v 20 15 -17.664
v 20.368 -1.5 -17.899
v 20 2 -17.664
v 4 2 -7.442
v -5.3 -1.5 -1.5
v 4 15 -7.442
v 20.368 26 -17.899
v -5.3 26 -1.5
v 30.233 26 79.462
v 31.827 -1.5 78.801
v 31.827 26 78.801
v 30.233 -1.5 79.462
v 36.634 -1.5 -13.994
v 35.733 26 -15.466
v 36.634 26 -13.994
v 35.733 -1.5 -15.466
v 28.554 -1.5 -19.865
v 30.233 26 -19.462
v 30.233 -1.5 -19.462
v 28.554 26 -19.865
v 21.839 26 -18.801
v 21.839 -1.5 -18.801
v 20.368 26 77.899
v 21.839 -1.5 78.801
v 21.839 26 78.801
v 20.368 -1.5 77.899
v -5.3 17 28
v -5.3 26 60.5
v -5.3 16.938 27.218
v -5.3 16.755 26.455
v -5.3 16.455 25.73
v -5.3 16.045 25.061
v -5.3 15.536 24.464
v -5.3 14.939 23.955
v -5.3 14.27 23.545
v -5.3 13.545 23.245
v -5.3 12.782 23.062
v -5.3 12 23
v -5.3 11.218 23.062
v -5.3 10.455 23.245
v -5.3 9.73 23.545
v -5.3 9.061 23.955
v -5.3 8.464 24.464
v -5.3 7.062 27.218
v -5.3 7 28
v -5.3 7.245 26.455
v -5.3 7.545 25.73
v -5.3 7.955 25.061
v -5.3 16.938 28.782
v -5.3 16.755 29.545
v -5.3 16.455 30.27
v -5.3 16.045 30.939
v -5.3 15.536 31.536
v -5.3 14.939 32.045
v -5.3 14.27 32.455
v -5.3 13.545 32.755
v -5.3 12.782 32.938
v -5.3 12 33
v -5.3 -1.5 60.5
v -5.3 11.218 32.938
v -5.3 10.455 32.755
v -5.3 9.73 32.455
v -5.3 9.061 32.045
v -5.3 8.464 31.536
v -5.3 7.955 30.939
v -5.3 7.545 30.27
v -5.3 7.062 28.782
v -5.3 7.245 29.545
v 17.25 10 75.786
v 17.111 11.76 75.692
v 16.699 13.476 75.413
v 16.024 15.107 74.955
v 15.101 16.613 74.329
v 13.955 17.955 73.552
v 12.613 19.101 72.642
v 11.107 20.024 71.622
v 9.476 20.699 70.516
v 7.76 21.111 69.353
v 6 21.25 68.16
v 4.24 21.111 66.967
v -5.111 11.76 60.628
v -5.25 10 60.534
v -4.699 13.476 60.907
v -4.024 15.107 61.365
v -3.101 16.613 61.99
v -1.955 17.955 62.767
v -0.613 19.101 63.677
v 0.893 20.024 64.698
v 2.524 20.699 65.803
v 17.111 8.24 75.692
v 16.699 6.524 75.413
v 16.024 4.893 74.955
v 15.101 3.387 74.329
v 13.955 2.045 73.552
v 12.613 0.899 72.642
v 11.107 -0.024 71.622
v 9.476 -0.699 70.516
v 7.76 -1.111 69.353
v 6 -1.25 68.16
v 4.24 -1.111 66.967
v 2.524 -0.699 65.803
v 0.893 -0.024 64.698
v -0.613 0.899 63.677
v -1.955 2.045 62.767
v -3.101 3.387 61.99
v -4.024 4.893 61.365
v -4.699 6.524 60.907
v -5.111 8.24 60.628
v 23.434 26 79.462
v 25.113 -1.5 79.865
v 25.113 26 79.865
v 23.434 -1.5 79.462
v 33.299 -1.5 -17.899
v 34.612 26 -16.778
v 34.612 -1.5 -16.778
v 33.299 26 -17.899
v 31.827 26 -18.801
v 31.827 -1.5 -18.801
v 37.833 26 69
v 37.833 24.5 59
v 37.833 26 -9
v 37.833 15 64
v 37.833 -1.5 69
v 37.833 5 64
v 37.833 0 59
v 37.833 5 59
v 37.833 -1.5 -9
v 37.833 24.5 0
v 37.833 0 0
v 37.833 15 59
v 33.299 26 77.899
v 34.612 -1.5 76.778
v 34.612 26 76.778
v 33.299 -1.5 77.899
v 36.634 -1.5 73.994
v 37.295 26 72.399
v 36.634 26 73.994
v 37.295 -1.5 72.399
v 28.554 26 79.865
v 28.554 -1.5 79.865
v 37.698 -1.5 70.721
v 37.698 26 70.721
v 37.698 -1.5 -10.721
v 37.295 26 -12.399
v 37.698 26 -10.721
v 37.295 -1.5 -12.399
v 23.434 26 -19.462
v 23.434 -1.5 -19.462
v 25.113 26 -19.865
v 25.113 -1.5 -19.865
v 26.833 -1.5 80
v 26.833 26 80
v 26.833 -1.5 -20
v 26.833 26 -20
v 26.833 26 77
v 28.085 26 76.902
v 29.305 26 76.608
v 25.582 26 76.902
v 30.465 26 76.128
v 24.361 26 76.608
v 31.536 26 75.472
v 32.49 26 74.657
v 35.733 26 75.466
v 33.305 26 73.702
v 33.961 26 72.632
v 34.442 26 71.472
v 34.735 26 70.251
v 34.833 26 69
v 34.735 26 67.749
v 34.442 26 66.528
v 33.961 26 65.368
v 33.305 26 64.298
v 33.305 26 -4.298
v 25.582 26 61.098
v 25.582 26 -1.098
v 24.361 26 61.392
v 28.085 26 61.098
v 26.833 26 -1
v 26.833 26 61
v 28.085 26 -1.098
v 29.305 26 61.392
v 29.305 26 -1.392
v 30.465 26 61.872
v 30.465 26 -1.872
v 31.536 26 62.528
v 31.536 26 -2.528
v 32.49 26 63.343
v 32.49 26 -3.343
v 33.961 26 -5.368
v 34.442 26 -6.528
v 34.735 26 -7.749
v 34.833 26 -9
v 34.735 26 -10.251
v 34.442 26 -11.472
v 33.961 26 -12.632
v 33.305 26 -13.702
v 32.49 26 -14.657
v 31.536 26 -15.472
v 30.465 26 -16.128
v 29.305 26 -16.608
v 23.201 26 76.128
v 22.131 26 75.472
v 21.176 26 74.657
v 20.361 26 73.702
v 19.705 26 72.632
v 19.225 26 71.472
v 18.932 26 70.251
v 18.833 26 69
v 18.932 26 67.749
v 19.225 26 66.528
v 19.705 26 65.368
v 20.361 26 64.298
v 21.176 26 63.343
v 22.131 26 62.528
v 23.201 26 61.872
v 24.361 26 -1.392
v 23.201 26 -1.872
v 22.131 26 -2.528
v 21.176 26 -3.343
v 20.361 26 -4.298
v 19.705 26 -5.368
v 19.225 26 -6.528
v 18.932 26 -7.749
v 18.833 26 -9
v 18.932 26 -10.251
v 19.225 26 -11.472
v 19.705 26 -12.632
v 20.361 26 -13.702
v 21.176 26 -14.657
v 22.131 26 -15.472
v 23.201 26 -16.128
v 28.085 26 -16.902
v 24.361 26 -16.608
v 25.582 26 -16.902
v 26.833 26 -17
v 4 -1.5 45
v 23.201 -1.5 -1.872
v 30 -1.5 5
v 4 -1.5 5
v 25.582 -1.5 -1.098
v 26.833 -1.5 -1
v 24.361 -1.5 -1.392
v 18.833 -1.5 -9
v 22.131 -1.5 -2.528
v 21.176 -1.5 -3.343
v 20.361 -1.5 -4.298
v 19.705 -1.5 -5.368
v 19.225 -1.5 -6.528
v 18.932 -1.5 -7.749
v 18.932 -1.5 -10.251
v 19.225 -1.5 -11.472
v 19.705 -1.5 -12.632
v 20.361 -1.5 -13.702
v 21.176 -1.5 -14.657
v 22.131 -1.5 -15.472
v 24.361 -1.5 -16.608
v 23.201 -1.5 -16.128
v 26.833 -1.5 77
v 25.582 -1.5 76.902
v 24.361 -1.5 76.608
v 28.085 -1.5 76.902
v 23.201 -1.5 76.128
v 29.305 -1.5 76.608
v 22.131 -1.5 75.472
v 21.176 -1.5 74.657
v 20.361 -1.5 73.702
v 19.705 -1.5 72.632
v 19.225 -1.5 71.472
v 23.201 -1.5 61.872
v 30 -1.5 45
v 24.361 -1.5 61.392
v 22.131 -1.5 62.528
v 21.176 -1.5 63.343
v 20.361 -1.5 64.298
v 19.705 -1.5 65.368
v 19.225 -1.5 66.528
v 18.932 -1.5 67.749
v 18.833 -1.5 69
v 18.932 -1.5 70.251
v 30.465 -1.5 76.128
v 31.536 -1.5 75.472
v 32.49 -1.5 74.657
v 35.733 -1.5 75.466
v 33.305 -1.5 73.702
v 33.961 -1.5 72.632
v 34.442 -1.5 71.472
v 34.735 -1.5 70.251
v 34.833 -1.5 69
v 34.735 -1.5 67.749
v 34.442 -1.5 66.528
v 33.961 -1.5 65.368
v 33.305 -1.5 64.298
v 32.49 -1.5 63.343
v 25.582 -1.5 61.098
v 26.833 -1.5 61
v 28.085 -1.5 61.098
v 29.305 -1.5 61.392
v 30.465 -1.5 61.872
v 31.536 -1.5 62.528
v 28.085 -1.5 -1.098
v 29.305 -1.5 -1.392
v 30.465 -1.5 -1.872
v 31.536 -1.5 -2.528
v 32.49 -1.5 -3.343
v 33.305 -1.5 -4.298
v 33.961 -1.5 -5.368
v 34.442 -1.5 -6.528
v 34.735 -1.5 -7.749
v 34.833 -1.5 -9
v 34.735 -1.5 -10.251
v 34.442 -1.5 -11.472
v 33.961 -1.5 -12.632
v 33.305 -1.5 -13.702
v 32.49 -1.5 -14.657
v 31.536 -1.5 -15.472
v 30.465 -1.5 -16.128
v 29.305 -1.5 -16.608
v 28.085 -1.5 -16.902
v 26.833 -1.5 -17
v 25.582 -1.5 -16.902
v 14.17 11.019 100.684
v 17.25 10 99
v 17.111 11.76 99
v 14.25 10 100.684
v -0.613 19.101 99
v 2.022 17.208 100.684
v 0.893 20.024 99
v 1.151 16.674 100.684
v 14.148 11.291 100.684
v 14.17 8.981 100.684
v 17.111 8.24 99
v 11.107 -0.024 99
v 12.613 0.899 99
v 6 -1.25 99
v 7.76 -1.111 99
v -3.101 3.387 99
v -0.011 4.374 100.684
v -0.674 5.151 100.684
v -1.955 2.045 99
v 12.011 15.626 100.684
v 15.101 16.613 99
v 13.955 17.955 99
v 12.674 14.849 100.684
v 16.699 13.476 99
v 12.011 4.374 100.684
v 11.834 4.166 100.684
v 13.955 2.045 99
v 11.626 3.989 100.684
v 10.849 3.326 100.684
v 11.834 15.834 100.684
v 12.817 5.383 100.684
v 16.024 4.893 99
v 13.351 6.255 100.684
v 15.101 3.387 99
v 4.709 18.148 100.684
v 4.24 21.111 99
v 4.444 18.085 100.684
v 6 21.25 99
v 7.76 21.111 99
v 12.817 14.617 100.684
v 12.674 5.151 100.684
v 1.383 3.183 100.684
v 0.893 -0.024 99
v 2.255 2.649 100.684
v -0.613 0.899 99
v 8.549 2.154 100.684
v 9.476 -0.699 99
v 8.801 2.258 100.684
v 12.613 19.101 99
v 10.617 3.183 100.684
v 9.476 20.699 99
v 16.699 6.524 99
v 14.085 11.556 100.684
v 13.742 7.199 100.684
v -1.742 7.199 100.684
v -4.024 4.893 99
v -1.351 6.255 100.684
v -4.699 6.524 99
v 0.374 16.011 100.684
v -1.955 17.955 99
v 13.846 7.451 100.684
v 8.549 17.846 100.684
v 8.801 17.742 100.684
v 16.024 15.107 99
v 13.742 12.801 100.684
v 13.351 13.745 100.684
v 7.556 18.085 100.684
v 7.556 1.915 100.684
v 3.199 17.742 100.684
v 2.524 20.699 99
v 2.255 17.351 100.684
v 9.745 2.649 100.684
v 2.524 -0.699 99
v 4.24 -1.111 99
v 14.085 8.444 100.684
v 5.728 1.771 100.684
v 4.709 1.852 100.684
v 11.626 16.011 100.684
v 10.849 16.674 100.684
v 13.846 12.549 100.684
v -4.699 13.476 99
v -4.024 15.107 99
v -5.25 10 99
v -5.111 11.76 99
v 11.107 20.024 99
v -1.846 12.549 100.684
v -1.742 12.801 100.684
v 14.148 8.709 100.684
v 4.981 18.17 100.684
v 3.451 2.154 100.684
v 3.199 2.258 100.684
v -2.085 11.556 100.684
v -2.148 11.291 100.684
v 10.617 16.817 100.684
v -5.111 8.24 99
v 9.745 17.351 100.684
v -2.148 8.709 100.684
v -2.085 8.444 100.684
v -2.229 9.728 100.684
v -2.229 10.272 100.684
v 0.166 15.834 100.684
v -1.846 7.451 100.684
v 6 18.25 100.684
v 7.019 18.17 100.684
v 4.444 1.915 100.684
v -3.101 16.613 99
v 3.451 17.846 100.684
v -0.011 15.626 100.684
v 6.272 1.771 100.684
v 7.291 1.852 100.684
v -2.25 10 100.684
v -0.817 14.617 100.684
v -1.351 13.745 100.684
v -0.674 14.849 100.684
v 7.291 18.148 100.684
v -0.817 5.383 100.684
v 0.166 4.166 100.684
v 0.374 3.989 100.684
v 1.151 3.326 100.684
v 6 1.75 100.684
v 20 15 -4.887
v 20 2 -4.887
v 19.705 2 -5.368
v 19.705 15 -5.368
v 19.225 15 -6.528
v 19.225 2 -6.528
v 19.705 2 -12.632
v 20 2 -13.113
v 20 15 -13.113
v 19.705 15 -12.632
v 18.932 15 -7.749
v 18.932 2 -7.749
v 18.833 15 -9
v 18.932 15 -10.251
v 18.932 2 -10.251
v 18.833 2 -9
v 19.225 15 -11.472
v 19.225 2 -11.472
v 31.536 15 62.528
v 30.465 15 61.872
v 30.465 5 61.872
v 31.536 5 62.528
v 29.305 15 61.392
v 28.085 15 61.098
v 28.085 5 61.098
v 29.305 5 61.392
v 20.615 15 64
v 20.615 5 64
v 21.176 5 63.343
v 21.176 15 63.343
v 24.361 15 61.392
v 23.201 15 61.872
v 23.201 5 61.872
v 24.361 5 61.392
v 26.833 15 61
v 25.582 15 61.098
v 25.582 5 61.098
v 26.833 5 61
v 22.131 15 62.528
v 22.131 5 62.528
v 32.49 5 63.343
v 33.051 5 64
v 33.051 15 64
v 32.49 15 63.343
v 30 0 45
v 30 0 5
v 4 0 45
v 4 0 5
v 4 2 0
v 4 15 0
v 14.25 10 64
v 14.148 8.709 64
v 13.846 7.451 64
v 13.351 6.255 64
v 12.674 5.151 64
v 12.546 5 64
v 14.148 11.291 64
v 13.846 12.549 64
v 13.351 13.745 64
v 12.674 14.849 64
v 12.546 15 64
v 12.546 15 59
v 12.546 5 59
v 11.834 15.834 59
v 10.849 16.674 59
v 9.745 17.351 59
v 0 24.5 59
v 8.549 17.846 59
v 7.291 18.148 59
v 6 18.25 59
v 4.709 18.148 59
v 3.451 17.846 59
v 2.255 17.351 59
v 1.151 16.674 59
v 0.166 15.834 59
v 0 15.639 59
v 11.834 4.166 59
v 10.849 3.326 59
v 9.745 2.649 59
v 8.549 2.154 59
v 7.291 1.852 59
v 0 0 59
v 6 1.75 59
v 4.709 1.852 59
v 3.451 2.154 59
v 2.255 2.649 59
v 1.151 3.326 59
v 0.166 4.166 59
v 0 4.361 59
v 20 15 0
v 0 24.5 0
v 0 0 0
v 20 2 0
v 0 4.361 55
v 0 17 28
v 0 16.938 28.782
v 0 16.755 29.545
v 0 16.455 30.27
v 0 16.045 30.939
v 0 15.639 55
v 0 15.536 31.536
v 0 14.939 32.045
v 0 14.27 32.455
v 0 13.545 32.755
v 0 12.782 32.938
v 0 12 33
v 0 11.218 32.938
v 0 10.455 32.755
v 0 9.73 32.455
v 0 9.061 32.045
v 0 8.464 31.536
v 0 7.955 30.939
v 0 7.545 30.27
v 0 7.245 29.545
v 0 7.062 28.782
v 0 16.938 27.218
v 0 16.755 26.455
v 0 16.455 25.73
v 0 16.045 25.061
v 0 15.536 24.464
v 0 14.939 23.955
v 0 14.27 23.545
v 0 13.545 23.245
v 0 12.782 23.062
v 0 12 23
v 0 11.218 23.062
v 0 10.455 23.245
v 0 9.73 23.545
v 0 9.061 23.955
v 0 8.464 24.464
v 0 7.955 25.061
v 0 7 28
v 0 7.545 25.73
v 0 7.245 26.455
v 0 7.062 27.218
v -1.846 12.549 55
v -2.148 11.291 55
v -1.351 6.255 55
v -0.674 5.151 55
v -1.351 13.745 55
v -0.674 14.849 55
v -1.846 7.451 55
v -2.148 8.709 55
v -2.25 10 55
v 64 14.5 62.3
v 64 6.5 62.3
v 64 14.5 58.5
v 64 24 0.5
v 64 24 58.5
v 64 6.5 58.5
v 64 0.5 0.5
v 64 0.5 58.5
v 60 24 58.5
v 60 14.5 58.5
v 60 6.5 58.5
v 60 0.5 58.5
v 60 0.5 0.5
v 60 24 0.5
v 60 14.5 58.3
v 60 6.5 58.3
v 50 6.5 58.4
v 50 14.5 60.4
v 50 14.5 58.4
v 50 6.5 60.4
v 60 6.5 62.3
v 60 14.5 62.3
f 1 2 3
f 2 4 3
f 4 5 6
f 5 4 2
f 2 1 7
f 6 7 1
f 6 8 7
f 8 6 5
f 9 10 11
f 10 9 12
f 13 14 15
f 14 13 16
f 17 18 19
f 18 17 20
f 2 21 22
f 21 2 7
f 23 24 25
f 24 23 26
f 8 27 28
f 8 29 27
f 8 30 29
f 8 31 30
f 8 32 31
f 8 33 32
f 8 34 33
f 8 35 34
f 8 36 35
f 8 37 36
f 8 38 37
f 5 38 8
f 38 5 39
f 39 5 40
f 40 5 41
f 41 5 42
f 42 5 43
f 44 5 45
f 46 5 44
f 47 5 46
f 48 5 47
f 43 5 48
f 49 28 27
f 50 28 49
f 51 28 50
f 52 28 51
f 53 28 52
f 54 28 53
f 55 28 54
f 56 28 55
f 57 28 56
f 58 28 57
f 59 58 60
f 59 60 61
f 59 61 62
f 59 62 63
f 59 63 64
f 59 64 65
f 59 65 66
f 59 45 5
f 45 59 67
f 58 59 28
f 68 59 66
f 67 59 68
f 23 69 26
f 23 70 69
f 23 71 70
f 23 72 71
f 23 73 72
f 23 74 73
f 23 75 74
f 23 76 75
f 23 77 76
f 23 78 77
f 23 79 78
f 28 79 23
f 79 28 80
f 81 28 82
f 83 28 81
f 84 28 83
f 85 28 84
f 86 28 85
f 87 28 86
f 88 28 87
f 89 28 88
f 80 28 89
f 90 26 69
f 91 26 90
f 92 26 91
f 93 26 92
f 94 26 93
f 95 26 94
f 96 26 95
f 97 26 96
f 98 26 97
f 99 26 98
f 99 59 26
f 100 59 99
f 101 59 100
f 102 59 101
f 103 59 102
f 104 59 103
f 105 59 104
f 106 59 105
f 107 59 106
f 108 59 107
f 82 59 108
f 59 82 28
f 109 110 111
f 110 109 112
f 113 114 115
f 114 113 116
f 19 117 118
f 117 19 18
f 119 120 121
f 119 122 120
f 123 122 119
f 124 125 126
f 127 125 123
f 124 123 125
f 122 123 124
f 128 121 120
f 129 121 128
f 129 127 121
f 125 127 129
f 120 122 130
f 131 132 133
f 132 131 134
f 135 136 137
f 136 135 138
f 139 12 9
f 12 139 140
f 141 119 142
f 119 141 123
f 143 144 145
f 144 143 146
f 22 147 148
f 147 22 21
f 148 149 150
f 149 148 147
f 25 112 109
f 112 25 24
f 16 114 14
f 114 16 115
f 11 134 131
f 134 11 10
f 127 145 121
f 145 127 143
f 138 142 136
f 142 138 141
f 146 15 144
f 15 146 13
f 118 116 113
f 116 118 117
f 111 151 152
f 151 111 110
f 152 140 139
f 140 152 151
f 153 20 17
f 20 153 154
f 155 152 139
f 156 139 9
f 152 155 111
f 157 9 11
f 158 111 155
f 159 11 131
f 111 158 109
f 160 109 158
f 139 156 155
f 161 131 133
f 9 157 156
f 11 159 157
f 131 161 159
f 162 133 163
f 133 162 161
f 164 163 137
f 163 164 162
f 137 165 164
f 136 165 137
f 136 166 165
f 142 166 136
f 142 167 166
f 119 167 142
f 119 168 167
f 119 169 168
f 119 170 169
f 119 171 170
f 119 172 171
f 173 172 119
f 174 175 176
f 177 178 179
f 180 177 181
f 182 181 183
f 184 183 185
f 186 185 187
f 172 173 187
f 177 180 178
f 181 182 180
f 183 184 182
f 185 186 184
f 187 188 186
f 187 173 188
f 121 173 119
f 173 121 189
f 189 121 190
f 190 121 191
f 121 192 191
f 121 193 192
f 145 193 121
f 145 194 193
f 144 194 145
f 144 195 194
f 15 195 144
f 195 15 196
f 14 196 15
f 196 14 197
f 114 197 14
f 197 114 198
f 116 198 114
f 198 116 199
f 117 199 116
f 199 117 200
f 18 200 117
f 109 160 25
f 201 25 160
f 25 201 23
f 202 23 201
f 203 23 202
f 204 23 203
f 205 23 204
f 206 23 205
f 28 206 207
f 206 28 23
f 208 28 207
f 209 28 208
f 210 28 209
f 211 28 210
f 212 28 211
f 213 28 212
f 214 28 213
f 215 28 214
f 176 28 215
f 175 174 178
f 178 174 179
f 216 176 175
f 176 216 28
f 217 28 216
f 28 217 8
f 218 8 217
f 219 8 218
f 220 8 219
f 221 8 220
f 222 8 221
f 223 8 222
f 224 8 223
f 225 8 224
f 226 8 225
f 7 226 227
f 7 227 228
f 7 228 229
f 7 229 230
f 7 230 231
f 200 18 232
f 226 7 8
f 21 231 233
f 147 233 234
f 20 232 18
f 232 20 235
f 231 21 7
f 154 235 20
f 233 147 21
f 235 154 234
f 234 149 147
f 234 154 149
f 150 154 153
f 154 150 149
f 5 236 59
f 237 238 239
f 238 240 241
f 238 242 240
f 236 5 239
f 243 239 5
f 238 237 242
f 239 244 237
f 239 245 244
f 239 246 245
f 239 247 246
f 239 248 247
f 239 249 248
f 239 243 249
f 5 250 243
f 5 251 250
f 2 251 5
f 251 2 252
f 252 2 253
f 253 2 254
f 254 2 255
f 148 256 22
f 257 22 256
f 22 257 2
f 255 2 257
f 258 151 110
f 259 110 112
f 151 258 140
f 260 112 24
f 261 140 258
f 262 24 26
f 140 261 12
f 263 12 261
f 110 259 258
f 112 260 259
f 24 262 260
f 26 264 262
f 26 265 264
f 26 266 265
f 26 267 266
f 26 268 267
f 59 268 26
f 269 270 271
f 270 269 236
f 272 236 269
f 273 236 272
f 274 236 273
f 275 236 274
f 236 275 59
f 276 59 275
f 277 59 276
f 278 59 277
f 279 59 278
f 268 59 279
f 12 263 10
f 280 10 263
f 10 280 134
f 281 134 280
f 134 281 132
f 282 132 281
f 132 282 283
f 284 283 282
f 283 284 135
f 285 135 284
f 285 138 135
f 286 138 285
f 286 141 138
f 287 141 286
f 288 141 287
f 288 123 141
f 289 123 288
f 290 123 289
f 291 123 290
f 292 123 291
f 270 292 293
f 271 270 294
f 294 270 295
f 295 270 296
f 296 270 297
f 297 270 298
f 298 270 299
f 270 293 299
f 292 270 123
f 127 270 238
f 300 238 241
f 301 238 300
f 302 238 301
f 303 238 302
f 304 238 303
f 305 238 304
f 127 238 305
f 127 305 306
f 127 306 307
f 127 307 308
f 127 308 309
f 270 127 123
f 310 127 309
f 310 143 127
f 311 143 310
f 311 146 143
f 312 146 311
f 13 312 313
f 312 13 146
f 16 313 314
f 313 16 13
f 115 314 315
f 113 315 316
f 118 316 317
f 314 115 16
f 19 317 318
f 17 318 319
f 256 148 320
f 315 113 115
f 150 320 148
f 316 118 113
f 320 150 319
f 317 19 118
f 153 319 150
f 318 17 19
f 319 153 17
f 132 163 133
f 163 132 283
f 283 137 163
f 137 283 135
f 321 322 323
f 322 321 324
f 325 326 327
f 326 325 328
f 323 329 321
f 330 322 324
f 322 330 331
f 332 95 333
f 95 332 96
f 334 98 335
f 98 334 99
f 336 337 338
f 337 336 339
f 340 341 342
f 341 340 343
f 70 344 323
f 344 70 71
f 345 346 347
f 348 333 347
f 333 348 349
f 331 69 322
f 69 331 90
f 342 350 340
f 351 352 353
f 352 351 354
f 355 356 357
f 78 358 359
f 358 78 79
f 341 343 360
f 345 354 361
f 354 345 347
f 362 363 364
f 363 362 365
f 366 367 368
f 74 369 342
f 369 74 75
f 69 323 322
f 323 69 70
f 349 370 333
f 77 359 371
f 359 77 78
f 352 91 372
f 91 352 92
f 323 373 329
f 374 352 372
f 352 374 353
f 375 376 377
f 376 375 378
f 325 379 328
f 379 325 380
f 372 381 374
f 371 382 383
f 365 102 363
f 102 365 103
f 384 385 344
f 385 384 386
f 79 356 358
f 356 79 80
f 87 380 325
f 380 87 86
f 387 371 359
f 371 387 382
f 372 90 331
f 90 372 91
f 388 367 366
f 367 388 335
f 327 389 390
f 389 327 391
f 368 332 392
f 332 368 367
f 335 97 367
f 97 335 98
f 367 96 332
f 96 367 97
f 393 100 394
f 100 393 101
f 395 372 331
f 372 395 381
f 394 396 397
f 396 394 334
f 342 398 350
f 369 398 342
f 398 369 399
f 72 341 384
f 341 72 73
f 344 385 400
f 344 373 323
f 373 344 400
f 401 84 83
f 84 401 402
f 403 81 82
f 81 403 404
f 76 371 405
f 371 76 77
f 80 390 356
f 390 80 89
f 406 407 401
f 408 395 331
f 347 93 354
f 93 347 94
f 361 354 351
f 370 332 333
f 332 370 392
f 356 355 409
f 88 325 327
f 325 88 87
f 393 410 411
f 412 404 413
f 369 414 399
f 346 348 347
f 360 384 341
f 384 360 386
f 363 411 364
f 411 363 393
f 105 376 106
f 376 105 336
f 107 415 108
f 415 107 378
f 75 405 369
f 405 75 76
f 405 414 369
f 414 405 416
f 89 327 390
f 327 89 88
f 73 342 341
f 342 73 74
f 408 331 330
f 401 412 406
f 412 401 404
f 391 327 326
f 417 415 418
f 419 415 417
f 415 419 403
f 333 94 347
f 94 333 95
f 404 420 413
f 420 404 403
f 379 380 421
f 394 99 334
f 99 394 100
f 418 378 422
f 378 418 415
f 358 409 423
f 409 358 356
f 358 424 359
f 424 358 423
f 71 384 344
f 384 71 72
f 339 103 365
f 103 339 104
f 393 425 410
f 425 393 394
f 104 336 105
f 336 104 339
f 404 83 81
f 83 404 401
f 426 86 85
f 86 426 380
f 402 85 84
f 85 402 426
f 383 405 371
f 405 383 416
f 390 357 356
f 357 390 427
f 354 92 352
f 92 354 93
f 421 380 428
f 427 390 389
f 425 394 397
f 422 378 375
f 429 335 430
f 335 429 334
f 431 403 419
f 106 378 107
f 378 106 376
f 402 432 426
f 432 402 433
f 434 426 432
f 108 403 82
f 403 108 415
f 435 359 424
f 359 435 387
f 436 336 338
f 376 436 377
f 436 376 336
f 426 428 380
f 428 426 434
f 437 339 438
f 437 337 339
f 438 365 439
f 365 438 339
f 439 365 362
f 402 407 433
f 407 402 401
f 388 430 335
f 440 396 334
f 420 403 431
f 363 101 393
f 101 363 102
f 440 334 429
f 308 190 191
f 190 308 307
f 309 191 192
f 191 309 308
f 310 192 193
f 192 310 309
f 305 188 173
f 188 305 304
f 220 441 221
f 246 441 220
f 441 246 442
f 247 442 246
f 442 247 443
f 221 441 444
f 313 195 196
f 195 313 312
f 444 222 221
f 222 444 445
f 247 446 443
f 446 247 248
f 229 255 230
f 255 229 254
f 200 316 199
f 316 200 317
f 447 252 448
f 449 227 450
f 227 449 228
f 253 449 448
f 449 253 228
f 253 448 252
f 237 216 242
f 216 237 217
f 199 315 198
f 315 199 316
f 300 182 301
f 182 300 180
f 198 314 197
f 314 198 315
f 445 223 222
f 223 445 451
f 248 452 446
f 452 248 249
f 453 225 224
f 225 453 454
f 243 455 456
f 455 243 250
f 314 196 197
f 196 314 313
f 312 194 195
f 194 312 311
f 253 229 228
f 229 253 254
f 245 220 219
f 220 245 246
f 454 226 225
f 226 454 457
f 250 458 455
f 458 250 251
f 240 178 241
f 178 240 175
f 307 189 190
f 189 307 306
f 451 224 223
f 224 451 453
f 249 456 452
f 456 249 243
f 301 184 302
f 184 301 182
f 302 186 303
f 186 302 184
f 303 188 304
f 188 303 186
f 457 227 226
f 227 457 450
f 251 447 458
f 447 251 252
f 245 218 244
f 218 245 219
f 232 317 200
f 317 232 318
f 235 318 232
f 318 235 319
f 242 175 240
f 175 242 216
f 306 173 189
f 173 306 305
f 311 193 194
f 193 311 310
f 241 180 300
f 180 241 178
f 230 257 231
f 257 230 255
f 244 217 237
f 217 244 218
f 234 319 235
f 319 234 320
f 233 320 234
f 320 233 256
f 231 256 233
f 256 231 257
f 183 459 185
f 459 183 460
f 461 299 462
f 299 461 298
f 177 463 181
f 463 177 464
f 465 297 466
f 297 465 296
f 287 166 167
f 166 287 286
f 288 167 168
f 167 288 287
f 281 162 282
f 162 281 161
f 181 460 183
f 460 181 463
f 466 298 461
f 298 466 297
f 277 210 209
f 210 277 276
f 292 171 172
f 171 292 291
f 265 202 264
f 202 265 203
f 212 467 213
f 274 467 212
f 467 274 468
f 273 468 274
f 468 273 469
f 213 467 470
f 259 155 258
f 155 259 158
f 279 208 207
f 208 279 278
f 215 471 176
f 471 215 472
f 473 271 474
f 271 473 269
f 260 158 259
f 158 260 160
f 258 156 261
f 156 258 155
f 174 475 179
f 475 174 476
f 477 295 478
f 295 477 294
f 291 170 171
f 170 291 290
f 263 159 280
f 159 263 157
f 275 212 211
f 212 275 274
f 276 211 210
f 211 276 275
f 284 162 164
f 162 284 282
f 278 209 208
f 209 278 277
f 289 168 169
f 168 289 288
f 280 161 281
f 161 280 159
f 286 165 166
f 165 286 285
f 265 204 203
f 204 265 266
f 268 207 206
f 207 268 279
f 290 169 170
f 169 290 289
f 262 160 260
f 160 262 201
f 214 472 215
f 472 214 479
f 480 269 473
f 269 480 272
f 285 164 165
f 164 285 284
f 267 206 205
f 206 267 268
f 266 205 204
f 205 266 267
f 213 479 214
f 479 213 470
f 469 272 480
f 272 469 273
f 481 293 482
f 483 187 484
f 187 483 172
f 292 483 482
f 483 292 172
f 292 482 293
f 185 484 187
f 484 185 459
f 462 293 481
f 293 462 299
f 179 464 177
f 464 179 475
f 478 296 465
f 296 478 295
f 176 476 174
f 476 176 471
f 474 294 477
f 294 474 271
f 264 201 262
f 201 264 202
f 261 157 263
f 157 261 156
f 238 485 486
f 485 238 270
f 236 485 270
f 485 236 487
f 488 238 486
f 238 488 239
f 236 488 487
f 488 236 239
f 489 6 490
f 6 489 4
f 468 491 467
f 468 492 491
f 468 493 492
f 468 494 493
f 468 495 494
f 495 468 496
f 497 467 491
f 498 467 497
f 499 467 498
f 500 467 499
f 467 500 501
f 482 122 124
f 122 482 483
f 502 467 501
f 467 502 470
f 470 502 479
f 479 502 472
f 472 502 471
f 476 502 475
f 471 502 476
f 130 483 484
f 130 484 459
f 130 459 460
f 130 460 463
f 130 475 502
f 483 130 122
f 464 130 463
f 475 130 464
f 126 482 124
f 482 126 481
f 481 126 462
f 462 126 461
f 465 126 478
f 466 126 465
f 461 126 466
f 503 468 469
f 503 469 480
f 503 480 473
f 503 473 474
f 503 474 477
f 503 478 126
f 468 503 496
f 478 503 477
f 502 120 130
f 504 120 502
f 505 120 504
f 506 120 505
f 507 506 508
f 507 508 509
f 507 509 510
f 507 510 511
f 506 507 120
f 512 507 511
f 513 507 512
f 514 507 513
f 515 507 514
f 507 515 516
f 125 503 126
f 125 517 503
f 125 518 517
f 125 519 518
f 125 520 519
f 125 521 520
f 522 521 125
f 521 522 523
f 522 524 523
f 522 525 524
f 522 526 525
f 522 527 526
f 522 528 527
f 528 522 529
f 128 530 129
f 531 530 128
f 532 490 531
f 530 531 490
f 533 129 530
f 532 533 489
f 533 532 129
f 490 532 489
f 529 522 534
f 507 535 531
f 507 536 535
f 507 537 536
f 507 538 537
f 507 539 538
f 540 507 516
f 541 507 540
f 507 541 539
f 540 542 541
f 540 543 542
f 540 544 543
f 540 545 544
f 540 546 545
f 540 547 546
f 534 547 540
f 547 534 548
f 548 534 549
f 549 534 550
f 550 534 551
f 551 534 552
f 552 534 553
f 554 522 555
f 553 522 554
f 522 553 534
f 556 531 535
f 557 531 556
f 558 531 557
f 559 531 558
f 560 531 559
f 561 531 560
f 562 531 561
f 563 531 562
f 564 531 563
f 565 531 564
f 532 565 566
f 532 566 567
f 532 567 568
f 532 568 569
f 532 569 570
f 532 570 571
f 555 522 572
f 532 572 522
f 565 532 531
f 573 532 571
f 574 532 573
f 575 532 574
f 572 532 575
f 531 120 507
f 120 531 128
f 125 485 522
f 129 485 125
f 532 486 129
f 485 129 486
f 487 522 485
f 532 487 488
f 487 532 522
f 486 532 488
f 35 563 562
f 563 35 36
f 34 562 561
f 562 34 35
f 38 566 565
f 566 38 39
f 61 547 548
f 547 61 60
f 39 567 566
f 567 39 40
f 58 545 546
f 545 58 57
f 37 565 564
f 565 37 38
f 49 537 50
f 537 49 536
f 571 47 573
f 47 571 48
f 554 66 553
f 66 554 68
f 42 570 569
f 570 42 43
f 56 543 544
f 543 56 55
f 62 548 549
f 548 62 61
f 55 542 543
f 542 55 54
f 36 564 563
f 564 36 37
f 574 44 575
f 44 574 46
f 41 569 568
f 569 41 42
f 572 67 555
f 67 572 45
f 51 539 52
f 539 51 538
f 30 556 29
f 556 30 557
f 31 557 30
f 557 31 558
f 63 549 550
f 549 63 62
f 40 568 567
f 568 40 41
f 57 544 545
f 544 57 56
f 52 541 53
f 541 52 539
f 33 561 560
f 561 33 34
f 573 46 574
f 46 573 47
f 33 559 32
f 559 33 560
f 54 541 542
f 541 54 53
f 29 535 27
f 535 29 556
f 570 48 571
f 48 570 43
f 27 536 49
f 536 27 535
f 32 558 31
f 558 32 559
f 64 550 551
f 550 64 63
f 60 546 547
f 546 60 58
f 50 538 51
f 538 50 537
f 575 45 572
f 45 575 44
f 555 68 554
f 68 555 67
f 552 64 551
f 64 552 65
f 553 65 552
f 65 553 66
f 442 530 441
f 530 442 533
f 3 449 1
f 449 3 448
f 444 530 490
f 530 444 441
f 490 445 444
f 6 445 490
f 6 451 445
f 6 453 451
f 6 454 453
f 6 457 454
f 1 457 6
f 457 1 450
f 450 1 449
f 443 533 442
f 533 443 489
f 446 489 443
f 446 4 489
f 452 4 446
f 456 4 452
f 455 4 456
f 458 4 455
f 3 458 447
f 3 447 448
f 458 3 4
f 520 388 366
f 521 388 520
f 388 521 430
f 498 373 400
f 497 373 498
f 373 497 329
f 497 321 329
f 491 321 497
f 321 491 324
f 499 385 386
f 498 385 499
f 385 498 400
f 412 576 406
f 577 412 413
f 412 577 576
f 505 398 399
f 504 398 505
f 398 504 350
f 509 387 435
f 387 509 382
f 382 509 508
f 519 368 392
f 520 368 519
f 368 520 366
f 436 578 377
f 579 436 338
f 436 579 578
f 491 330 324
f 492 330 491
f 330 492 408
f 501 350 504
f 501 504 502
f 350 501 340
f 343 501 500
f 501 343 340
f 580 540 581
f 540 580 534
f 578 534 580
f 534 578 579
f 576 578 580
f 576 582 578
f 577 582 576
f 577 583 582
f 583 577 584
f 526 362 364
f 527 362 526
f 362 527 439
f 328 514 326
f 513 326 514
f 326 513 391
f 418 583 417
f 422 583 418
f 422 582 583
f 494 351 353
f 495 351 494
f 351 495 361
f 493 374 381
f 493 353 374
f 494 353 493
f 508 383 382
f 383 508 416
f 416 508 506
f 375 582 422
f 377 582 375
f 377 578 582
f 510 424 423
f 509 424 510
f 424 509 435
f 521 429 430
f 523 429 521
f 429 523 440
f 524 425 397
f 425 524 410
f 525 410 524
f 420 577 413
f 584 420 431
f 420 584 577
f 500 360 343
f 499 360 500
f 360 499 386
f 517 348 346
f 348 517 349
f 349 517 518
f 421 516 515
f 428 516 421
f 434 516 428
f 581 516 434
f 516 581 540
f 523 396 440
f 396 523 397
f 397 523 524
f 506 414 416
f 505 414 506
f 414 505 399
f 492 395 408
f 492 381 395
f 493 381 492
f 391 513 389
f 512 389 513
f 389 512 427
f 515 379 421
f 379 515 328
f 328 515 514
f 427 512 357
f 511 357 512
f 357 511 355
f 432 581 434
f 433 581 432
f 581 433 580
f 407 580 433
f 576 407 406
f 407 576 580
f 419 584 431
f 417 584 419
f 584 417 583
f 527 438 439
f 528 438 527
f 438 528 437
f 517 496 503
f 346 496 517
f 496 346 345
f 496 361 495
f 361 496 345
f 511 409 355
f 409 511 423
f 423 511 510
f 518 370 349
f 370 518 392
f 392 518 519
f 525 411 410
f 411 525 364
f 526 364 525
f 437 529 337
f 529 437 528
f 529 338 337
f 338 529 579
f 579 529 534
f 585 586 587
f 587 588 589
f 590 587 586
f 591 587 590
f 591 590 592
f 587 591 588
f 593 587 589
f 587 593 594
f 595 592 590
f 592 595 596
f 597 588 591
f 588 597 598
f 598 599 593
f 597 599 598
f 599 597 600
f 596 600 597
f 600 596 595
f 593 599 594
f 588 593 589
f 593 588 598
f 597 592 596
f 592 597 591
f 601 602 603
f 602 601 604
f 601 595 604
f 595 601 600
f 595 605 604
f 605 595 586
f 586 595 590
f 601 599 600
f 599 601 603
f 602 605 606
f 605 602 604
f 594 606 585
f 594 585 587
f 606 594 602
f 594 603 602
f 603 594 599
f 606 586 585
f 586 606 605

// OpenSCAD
$fn=40;

//taille du pico APRS
picoX=33.5;
picoY=24.5;
picoZ=59;

//diamètre antenne
antenne=16.5;  //16.5 for nagoya NA-771
connect=40;    //high connector antenna

//épaisseur du boitier
paroi=1.5;

//attach
fixation=16;
    
    
difference(){
    //boitier à imprimer
leftbox=3.8;        
    union(){
        hull(){
        translate([-paroi-leftbox,-paroi,-paroi])cube ([picoX+(2*paroi)+leftbox,picoY+(2*paroi),picoZ+(2*paroi)]);  //box
        translate([picoX*2/3+3+paroi,-paroi,-fixation/2-1])rotate([270,0,0])cylinder(r=fixation/2+paroi*2, h=picoY+2*paroi); // attachdown
        translate([picoX*2/3+3+paroi,-paroi,picoZ+fixation/2+2])rotate([270,0,0])cylinder(r=fixation/2+paroi*2, h=picoY+2*paroi); //attachUP
      
        }
        hull(){
        translate([6,10,picoZ+connect])cylinder(r=antenne/4, h=4); //antenna support
        translate([6,10,picoZ])cylinder(r=antenne/2+3, h=connect); //antenna support
        translate([6,10,-3])cylinder(r=antenne/4, h=2); //antenna support
        }
}


    // choses à enlever
    enlever();
    bigantenne();
    picoAPRS();  // original picoAPRS
}    
    





module enlever(){
//tout ça est à retirer

//deux fixation pour attacher le tout sur quelque chose
translate([picoX*2/3+3+paroi,40,-fixation/2-1])rotate([90,0,0])cylinder(r=fixation/2, h=60); //attachdown
translate([picoX*2/3+3+paroi,40,picoZ+fixation/2+2])rotate([90,0,0])cylinder(r=fixation/2, h=60); ////attachUP

//dégagement face avant
color("red"){translate([4,-5,5])cube([26,15,40]);} //

//ease install picoAPRS
translate([6,10-5,54])cube([60,10,10]); //for translate picoAPRS SMA
cube ([picoX*2,picoY,picoZ]); // for translate picoAPRS box
translate([-25,12,28])rotate([0,90,0])cylinder(r=5, h=40); // pour ejecter le picoAPRS
translate([4,2,-50])cube([16,13,55]); // USB




}


//couvercle
translate([60,0.5,0.5]){
    cube ([4,23.5,picoZ-1]);
    hull(){
        translate([0,6,picoZ-1.2])cube ([4,8,4]);
        translate([-10,6,picoZ-1.1])cube([12,8,2]);
    }
}







module picoAPRS() {
color("blue"){
cube ([picoX,picoY,picoZ]);
translate([6,10,55])cylinder(r=4, h=8);}
}

module bigantenne(){
    translate([6,10,55])cylinder(r=antenne/2, h=60);}
